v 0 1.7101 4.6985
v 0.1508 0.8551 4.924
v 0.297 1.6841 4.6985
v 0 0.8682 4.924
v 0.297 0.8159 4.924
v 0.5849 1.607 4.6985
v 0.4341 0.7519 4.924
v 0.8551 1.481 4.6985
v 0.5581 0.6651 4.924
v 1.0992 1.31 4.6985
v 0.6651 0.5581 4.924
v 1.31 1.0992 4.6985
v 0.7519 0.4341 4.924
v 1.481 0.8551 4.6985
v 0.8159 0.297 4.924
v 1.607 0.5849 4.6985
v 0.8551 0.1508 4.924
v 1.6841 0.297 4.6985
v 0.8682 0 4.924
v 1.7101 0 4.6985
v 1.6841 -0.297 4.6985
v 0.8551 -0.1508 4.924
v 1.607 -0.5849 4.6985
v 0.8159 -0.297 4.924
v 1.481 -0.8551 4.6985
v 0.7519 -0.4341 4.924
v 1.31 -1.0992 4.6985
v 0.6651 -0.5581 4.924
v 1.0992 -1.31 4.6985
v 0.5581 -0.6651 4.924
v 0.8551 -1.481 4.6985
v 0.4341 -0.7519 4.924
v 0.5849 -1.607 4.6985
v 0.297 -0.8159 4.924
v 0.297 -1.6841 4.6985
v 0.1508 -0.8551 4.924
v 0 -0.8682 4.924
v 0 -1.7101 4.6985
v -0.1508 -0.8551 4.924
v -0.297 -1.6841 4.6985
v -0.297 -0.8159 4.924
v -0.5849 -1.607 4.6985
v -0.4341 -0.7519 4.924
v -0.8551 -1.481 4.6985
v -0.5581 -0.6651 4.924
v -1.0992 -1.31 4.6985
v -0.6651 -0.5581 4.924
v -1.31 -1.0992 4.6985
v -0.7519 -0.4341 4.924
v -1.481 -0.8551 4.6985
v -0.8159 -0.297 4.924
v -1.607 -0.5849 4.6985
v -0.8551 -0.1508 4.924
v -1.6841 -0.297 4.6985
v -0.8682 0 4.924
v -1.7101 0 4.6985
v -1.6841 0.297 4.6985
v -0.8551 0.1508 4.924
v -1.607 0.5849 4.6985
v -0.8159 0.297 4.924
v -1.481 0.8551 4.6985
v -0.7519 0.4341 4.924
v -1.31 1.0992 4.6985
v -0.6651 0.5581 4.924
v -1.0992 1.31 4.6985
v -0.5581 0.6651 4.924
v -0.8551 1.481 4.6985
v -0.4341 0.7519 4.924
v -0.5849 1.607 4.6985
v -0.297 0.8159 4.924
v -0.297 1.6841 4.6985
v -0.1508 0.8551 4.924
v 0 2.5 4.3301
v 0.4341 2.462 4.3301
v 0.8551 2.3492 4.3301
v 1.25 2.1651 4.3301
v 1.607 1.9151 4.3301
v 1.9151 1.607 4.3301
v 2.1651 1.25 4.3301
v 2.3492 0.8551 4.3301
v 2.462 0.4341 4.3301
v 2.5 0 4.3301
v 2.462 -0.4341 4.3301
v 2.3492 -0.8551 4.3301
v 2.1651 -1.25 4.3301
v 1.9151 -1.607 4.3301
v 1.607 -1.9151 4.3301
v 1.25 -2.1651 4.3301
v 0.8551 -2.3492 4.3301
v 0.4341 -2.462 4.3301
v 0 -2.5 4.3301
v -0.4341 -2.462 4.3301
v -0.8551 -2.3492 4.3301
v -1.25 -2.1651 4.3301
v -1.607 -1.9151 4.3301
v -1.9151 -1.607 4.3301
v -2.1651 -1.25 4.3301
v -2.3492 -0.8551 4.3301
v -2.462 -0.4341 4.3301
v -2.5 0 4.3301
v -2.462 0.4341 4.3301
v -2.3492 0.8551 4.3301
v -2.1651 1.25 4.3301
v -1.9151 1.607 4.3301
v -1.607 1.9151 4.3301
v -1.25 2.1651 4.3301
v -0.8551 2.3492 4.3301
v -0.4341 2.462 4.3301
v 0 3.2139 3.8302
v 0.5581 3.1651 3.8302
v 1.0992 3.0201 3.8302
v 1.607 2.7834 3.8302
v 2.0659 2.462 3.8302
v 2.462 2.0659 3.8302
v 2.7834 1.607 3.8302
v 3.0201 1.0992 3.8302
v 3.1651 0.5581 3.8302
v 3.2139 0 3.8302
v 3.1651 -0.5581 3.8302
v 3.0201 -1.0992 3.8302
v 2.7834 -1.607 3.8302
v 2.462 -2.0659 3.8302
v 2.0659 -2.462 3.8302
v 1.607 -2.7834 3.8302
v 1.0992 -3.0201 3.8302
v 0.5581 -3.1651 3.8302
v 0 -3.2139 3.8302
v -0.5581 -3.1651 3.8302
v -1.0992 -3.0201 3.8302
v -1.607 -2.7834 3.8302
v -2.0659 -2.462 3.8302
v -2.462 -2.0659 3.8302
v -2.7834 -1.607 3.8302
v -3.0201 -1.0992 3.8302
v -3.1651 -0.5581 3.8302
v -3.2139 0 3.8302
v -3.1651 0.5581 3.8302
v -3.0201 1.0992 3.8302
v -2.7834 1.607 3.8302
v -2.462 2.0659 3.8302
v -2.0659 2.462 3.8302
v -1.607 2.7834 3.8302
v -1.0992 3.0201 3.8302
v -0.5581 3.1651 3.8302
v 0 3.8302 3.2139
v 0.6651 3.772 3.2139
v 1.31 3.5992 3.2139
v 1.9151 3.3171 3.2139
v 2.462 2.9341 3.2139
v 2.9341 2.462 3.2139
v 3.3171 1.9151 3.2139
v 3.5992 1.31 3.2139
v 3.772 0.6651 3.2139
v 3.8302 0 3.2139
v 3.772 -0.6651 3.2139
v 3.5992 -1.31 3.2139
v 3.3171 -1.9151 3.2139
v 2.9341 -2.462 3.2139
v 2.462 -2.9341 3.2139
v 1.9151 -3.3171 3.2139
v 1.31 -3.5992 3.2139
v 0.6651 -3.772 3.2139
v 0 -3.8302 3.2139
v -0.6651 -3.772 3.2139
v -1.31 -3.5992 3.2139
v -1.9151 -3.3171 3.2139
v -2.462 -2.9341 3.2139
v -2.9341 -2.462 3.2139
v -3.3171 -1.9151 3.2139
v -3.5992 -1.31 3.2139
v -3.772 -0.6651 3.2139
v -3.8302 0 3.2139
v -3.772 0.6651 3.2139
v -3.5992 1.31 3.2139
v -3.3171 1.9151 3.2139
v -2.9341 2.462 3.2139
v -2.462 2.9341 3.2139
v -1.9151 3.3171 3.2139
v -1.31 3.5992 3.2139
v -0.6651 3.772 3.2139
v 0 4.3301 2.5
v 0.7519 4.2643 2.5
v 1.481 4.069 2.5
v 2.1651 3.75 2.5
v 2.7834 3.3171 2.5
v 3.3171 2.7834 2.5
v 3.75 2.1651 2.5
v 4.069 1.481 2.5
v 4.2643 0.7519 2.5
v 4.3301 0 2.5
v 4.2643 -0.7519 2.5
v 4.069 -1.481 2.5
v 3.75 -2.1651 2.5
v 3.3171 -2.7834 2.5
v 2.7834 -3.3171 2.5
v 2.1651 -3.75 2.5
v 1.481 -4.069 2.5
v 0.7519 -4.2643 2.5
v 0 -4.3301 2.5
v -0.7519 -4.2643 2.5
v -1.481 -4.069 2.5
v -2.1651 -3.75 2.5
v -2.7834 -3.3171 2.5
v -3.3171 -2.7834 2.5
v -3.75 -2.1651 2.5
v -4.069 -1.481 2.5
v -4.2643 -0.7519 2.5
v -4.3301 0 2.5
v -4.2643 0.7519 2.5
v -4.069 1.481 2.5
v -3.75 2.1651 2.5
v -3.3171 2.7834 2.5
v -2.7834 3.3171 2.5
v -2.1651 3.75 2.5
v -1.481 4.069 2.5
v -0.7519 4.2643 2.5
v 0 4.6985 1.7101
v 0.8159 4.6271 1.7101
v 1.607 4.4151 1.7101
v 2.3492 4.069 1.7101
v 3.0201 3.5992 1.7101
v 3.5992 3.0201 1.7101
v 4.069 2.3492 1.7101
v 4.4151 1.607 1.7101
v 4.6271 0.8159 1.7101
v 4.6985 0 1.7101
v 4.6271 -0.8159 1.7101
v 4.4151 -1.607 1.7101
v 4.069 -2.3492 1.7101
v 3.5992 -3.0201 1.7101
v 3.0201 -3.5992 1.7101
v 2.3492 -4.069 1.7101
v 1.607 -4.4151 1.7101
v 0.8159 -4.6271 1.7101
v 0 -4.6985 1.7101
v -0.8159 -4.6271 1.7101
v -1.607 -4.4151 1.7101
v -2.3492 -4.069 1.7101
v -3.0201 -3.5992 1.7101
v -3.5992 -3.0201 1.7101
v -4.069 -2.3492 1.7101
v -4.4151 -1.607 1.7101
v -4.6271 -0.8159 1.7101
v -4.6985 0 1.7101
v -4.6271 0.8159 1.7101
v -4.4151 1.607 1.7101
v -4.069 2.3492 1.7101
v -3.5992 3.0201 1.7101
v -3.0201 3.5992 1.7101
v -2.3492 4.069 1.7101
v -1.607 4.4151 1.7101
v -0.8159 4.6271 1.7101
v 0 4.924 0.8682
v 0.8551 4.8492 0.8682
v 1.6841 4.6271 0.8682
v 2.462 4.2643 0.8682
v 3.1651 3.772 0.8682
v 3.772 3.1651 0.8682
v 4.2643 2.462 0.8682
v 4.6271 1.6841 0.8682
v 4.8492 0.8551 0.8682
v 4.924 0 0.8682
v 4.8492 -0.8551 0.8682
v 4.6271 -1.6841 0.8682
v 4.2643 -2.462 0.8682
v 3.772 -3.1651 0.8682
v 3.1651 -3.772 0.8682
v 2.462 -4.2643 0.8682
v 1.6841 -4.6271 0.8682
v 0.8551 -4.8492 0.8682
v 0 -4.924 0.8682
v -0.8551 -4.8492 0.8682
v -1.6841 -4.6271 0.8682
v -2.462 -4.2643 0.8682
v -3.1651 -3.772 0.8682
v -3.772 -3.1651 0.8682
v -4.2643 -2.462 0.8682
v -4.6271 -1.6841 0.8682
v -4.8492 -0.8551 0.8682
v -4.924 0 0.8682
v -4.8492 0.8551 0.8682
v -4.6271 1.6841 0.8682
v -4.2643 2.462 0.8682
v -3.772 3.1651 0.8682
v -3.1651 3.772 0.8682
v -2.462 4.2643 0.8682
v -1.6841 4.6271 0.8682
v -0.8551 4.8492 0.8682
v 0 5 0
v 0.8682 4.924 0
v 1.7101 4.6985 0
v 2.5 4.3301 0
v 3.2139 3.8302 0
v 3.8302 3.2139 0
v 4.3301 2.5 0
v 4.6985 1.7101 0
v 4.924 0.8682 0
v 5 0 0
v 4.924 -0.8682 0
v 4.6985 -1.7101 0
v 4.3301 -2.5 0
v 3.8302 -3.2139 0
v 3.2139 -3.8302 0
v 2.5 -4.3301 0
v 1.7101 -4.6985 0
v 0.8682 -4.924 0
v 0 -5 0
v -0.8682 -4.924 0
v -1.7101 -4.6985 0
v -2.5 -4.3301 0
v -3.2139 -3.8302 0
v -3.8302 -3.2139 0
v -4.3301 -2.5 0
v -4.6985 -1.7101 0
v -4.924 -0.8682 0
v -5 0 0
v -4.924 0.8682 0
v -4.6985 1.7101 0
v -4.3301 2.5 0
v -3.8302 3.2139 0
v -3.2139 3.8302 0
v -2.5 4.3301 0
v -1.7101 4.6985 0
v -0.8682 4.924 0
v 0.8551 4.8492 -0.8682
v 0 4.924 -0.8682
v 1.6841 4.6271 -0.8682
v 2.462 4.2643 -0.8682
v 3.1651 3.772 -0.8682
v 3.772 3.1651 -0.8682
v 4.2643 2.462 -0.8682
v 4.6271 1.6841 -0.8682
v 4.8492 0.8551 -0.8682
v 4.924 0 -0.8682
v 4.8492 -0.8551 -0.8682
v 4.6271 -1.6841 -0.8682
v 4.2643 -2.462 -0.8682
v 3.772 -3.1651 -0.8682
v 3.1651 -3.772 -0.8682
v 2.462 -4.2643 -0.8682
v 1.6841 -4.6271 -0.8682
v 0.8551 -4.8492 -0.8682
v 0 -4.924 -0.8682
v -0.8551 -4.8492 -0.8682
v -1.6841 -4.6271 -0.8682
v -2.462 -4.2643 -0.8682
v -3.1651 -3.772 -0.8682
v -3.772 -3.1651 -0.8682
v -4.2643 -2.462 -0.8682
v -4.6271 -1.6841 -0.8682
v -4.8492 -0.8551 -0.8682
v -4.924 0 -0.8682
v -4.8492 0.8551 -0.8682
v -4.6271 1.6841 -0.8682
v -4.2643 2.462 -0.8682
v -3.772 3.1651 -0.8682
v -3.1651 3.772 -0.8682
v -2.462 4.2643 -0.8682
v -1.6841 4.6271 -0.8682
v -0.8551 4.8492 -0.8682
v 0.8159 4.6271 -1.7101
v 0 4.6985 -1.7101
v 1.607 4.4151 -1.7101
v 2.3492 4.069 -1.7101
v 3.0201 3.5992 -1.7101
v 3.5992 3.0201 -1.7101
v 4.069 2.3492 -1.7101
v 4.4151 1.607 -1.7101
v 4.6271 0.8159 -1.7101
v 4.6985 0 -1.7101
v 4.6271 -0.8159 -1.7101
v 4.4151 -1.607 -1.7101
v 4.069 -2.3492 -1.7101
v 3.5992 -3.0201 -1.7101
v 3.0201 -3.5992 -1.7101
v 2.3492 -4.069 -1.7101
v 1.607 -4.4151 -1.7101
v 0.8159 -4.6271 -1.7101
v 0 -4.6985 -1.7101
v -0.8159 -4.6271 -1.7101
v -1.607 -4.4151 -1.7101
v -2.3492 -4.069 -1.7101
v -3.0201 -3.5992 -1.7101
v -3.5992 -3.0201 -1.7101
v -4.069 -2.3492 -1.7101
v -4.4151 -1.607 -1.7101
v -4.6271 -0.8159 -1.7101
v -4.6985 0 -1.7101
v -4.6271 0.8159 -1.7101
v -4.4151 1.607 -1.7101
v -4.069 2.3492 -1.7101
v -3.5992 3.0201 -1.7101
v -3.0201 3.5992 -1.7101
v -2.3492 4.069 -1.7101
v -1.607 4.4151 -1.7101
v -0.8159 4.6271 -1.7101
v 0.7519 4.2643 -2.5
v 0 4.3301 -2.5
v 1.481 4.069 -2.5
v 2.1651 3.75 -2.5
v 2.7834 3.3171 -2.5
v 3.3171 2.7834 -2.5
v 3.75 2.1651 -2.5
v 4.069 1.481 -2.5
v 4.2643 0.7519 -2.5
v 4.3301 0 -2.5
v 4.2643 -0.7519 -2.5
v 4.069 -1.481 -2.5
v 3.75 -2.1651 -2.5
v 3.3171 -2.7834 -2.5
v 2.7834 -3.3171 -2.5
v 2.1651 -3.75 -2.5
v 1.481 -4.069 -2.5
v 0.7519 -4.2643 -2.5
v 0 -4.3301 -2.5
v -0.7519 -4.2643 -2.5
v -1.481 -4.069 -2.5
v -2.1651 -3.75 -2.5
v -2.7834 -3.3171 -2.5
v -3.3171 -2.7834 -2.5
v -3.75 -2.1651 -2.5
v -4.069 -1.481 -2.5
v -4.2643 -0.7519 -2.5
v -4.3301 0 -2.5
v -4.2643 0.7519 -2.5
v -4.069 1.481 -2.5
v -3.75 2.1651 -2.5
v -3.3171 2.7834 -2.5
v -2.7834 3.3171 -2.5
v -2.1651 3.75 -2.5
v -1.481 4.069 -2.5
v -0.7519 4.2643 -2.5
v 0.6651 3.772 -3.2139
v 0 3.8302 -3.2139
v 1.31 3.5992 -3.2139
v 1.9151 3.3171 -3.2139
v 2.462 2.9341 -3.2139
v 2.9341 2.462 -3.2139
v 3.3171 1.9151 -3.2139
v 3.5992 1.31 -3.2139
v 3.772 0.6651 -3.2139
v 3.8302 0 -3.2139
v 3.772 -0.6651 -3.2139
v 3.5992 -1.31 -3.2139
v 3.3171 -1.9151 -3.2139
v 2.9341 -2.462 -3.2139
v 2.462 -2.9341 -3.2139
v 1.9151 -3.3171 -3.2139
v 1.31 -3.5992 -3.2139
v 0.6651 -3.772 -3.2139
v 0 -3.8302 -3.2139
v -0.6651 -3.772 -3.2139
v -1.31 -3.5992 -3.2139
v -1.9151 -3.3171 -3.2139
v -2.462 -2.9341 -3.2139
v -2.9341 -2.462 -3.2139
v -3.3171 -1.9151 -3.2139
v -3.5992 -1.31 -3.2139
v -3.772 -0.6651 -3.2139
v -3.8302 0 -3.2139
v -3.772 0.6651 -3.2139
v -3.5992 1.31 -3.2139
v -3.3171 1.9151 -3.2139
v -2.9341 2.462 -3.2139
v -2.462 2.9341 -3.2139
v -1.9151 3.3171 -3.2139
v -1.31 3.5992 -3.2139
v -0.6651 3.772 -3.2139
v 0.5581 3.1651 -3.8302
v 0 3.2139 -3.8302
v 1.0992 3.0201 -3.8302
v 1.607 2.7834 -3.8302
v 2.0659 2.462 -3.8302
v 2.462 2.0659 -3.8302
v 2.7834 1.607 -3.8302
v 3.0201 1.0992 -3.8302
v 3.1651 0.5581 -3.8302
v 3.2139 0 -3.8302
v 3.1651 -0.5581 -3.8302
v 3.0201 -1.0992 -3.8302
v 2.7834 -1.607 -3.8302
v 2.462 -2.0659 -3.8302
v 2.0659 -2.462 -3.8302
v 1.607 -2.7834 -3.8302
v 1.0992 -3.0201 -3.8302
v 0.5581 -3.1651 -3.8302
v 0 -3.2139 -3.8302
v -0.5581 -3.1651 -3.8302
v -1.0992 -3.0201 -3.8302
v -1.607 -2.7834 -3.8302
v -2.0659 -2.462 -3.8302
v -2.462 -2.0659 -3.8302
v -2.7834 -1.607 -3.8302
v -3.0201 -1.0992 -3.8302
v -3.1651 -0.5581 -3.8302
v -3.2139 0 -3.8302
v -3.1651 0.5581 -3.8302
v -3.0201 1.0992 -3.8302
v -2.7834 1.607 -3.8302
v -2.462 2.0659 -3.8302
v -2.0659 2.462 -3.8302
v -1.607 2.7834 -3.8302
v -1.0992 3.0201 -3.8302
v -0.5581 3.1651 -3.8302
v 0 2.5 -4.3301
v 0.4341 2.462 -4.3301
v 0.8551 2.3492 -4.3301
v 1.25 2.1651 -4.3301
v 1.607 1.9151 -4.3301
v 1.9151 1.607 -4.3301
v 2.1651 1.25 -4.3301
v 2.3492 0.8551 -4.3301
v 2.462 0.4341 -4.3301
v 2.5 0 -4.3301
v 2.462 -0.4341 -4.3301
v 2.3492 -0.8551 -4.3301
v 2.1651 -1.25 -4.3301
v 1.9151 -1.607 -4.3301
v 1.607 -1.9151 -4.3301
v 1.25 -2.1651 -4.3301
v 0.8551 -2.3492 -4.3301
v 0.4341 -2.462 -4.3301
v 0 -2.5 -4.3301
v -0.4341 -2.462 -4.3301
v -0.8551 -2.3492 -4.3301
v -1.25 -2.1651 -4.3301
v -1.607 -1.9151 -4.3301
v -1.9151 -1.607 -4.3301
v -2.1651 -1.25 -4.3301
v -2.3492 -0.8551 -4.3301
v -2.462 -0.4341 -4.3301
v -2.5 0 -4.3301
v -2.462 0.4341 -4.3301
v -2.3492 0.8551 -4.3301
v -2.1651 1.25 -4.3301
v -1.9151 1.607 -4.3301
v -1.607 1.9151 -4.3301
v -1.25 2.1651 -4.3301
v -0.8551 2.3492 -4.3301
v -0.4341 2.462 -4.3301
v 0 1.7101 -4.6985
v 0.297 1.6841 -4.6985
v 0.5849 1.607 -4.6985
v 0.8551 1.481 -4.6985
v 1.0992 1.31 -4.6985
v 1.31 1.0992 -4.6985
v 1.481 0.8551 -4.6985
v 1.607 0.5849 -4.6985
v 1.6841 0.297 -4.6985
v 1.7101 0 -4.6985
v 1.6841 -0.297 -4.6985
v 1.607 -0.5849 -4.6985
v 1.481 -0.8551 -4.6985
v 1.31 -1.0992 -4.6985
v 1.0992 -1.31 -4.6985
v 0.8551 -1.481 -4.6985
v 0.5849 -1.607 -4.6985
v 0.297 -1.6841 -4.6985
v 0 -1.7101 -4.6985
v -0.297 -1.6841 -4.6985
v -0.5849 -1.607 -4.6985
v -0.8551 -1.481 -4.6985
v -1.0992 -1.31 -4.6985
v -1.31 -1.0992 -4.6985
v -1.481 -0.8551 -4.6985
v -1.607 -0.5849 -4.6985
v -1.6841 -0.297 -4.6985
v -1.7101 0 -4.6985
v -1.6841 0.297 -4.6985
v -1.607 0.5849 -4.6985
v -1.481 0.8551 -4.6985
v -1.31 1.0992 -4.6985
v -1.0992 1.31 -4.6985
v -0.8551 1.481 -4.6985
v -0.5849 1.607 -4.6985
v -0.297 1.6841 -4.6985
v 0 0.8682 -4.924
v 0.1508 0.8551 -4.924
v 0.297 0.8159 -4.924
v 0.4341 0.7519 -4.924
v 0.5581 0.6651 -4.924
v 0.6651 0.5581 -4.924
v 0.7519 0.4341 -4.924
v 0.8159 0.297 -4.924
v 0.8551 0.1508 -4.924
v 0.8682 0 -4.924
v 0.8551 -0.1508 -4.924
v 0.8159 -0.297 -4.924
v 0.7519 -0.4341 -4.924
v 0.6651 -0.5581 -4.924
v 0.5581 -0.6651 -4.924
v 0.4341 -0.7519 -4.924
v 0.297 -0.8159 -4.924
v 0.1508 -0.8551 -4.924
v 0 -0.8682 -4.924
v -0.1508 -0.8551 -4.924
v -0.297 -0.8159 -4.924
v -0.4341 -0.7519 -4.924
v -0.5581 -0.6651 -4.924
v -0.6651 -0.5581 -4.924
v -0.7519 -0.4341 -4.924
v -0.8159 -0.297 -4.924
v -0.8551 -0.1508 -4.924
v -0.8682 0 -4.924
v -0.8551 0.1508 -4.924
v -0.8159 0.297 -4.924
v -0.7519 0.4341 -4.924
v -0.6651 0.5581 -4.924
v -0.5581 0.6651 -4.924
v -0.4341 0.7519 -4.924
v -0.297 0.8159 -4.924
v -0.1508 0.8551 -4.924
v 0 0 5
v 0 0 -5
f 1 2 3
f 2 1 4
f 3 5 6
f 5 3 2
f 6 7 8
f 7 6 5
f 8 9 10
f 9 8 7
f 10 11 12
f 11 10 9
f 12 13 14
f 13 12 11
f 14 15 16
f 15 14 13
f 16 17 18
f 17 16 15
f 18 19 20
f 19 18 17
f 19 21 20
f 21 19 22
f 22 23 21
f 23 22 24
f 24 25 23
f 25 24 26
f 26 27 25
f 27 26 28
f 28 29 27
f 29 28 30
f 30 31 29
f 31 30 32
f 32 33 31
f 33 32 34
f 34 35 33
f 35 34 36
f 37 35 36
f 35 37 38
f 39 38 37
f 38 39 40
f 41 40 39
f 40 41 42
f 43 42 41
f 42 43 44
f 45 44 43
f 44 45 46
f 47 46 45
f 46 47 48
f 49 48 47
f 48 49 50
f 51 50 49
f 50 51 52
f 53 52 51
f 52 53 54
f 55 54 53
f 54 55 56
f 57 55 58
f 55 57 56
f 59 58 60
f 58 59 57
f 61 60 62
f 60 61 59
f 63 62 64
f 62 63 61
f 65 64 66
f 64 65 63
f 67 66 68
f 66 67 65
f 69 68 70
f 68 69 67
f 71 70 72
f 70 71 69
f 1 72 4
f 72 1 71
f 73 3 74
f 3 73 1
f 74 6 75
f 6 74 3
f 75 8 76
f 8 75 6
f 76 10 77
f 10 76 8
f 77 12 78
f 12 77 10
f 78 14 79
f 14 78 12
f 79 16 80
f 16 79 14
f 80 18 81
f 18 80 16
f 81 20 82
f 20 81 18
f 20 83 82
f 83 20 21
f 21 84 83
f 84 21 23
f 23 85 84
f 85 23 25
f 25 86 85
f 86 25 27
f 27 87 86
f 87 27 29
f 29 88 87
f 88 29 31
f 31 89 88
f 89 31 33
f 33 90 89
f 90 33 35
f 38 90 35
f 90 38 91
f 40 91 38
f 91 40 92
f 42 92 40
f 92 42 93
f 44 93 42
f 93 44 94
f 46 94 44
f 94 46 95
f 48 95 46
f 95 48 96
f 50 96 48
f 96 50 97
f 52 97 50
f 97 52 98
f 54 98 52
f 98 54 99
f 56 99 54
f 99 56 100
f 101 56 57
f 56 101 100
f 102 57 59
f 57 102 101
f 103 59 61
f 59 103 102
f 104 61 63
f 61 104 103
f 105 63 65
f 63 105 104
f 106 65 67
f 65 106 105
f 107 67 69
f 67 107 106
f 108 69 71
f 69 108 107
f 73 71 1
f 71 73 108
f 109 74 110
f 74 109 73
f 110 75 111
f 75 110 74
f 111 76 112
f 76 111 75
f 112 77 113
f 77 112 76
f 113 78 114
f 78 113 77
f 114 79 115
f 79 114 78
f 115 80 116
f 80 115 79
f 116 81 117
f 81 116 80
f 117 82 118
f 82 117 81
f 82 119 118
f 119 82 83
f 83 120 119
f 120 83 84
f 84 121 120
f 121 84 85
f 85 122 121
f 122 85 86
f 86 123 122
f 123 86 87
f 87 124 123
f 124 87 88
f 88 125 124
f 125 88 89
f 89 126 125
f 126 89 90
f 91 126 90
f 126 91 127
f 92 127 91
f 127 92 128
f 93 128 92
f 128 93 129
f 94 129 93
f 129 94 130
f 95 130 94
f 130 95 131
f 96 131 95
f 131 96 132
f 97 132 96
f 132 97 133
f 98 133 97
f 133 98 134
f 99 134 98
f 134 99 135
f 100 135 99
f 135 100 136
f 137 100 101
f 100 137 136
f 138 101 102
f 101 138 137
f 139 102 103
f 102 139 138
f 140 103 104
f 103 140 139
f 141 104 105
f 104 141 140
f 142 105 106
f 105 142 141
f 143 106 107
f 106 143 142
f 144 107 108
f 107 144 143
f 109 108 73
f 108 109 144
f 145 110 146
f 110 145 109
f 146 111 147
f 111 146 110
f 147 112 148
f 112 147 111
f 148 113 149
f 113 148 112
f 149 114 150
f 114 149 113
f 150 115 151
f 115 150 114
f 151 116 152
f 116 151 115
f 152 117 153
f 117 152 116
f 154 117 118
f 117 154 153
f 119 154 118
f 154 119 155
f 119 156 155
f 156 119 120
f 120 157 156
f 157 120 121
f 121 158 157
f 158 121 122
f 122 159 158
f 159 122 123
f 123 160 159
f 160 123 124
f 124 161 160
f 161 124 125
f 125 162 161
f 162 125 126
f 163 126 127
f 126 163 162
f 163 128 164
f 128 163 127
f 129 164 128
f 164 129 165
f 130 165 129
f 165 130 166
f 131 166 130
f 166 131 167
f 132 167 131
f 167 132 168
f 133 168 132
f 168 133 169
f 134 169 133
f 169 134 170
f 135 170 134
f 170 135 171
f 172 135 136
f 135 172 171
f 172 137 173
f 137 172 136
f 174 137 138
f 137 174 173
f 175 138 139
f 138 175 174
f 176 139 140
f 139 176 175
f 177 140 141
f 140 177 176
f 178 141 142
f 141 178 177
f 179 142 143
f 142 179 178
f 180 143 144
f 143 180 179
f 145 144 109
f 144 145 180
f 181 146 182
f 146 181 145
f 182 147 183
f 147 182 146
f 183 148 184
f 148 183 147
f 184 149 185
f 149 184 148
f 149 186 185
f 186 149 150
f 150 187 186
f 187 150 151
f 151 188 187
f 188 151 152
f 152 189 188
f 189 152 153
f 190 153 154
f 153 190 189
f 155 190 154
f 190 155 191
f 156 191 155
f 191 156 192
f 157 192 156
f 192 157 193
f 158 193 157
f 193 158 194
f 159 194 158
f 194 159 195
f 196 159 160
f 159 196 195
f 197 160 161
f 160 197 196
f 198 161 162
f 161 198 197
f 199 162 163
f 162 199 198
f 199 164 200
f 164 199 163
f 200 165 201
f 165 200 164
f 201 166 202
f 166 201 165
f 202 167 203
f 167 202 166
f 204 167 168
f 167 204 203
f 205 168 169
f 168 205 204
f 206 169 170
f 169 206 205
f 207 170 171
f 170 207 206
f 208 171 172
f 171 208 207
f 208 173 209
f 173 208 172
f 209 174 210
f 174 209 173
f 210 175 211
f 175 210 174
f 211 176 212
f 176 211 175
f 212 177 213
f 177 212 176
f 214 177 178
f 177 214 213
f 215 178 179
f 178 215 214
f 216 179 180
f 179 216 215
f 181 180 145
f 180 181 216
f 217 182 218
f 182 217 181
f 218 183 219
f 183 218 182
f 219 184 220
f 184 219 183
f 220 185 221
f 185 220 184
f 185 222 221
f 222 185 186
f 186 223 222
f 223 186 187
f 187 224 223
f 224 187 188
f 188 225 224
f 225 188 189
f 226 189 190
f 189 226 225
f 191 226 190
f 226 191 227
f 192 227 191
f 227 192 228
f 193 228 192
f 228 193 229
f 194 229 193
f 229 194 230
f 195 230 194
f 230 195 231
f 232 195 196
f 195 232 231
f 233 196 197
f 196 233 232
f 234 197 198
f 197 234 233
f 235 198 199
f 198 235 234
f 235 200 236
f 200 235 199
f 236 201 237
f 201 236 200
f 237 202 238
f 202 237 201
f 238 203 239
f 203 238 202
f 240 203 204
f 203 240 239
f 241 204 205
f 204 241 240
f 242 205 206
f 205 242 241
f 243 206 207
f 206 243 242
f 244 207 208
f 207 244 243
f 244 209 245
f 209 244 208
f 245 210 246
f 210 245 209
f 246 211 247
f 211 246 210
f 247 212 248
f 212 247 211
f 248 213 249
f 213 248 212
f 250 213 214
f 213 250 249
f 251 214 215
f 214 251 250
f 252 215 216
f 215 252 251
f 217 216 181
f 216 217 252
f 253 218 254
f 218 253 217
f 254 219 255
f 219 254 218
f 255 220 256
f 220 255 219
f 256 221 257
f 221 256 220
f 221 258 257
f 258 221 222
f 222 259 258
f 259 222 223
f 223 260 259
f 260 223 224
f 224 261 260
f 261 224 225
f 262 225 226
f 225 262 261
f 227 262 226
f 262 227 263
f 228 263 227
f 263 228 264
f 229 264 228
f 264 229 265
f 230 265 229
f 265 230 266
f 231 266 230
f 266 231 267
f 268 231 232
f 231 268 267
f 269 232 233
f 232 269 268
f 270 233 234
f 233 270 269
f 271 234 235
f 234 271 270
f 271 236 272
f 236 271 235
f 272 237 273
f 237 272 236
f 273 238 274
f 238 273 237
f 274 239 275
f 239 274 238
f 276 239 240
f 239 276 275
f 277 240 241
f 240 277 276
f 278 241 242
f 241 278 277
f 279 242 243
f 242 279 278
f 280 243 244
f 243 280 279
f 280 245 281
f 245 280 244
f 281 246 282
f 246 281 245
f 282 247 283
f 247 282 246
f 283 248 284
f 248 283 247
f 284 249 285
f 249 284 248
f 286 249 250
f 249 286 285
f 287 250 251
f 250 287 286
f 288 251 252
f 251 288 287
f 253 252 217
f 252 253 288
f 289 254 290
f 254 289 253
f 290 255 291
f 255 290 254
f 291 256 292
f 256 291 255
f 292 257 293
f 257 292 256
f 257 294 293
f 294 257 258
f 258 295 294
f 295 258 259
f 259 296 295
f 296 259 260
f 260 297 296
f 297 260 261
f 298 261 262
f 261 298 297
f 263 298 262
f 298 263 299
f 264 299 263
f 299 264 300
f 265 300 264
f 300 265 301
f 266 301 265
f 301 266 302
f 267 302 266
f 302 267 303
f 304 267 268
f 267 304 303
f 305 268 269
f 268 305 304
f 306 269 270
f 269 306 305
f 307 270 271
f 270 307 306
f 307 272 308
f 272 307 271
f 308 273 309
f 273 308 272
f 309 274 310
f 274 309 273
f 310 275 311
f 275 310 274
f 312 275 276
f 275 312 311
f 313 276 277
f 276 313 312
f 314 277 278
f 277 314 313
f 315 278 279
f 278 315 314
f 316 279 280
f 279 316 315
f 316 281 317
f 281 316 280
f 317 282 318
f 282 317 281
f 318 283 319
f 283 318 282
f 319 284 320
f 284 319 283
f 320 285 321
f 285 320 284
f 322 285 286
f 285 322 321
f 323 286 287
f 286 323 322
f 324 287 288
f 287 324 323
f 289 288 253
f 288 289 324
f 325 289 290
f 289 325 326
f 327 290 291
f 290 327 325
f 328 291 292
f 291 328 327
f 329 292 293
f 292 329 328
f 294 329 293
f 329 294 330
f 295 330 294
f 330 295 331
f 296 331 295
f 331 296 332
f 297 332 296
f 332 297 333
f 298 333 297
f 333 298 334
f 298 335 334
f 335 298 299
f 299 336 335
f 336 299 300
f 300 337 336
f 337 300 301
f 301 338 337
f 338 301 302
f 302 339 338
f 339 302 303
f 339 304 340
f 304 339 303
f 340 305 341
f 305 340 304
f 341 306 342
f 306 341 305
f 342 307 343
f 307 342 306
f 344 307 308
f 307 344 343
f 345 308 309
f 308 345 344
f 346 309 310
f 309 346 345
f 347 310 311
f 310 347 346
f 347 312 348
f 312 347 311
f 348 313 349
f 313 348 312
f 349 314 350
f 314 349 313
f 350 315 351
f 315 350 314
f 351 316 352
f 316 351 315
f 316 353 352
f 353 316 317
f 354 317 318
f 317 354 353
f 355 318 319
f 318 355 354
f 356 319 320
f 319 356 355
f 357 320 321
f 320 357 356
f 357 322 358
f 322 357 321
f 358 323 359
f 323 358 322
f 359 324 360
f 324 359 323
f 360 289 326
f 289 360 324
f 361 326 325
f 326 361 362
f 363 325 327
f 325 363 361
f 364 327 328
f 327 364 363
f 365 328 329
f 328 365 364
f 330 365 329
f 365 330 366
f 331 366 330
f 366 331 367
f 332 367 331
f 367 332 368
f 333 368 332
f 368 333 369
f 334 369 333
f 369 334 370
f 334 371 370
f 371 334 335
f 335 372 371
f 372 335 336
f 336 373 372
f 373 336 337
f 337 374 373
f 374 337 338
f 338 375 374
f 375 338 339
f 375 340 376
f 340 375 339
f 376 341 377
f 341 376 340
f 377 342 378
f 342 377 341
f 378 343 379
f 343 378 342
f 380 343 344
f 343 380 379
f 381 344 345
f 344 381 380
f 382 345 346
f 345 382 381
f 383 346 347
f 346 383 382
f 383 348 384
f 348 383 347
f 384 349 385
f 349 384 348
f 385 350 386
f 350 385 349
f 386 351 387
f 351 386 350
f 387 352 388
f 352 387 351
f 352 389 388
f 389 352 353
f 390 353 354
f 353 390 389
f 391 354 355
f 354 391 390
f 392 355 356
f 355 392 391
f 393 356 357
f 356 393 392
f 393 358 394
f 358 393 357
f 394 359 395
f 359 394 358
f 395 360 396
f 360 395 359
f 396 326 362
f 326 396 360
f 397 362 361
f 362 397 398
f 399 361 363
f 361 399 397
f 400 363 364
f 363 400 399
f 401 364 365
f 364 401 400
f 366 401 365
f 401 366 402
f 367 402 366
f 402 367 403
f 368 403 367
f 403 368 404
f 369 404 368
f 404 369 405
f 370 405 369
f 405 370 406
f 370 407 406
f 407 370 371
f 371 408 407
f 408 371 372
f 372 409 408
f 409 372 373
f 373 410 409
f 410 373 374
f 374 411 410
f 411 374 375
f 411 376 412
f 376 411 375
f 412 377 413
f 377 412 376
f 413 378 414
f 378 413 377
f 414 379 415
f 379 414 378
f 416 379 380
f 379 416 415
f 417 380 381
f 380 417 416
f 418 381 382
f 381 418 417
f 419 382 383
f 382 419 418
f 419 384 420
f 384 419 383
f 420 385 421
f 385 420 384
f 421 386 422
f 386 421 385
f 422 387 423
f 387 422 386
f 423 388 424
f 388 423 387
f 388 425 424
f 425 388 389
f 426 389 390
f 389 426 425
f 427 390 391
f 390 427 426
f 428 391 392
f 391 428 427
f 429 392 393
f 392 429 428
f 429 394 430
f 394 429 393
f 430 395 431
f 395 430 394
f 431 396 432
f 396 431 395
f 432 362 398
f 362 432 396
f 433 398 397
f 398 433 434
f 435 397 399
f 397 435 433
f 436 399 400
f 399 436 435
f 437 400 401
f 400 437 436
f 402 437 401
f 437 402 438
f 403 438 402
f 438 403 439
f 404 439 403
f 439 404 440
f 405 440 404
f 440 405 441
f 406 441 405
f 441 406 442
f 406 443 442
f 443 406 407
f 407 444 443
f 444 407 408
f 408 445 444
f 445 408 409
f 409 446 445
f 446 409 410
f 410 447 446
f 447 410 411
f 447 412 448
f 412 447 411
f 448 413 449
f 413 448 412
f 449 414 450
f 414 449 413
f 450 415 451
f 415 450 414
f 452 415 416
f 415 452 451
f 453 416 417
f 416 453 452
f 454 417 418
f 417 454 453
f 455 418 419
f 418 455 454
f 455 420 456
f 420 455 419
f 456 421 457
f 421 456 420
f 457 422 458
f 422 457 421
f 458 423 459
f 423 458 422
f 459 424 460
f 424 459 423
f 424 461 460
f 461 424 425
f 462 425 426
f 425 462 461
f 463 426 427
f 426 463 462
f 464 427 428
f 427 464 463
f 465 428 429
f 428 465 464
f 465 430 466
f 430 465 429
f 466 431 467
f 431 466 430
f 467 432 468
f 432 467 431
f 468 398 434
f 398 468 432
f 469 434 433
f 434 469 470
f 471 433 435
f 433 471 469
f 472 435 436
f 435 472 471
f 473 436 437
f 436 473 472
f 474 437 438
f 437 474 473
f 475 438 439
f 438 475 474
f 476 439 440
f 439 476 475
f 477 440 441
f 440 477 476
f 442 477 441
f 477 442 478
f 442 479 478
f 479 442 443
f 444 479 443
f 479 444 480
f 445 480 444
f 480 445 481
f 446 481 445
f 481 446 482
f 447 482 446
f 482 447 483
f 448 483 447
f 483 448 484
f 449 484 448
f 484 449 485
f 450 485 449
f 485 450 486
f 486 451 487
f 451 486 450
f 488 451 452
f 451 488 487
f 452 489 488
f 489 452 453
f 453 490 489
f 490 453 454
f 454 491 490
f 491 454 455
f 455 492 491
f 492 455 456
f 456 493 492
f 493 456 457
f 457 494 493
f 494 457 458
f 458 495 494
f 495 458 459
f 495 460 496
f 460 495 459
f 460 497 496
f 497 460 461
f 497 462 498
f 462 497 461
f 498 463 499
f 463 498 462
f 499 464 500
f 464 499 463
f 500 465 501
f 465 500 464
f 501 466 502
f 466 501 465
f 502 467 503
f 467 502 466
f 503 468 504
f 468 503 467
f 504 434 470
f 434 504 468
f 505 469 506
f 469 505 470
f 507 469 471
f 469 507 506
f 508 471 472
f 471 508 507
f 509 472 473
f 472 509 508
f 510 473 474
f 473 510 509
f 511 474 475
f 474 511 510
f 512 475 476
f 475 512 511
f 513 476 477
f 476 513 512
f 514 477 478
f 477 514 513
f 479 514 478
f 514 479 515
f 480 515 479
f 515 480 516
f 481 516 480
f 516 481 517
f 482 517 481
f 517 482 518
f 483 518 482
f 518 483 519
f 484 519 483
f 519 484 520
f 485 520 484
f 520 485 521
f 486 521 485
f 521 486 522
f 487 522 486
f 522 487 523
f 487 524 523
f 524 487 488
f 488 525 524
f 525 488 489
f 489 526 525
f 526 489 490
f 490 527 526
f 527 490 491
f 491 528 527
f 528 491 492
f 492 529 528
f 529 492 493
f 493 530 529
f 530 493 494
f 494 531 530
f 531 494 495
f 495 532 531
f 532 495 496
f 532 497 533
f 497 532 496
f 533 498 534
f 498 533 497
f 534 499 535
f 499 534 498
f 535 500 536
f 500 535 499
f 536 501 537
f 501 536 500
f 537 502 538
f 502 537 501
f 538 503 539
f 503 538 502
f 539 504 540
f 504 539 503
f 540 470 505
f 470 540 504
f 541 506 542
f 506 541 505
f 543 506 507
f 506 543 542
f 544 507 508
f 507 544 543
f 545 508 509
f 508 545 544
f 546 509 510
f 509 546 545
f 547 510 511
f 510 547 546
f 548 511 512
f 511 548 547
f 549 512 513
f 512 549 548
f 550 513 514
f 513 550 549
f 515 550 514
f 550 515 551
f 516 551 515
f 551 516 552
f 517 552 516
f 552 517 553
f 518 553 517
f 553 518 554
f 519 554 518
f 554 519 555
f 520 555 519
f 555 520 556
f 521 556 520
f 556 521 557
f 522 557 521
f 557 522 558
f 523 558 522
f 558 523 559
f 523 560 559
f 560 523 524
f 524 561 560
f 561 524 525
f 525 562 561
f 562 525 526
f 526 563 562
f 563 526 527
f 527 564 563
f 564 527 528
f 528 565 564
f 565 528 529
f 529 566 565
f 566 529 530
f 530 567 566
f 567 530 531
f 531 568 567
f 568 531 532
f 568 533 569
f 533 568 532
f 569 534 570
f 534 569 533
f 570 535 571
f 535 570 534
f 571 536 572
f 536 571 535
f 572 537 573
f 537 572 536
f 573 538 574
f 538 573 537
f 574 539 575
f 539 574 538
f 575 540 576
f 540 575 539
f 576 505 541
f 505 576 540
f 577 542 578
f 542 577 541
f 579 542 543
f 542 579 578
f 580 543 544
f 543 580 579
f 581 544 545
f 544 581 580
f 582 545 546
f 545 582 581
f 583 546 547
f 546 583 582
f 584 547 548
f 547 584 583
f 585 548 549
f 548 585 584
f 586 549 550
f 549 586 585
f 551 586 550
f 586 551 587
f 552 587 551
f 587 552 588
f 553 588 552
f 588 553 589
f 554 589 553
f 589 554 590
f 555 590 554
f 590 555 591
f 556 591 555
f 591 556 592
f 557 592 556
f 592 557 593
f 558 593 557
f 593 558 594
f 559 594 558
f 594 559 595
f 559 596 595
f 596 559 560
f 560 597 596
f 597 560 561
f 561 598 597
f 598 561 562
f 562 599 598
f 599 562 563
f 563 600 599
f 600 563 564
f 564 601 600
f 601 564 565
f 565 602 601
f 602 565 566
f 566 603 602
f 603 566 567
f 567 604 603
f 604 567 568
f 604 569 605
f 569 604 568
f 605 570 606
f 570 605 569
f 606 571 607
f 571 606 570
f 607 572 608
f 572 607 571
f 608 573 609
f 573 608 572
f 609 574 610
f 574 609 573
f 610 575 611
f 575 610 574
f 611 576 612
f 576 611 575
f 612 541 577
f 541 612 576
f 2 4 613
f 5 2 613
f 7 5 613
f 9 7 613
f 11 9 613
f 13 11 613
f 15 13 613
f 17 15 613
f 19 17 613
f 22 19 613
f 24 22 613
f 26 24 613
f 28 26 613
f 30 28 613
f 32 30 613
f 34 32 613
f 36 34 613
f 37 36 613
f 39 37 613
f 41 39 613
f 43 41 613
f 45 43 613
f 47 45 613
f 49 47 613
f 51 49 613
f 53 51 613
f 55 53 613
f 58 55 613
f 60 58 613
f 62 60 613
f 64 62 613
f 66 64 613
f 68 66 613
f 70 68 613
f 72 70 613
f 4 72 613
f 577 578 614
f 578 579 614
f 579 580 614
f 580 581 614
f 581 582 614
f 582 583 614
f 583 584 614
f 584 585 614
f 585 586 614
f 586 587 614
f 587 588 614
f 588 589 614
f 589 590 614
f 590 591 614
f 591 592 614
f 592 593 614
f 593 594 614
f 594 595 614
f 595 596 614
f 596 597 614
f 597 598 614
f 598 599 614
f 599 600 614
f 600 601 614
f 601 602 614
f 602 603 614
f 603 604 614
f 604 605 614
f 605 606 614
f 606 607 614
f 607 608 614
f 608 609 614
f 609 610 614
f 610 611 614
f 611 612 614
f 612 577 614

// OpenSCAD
fDraw(fSphere(5));

///// Drawing modules
module fDraw(model) {
  polyhedron(points=fPoints(model),  faces=fFaces(model));
}

module fDrawN(model, scales) {
  fDraw(model);
  points = fPoints(model);
  model_max = fMaxPoint(model);
  translation =
    [for (axis = [0 : 2])
     scales[axis] * model_max[axis]];
  translate(translation) children();  
}

module fDrawX(model) {
  fDrawN(model, [1, 0, 0]) children();
}

module fDrawY(model) {
  fDrawN(model, [0, 1, 0]) children();
}

module fDrawZ(model) {
  fDrawN(model, [0, 0, 1]) children();
}

///// 3D object creation functions
function fCube(dims) = (
  let(x = fIsVector(dims) ? dims[0] : dims,
      y = fIsVector(dims) ? dims[1] : dims,
      z = fIsVector(dims) ? dims[2] : dims)
  [
    [fKeyPoints,  fCartesianProduct([[0, x], [0, y], [0, z]])],
    [fKeyFaces, [
      [0, 2, 3, 1], // -x
      [0, 1, 5, 4], // -y
      [0, 4, 6, 2], // -z
      [4, 5, 7, 6], // +x
      [2, 6, 7, 3], // +y
      [1, 3, 7, 5], // +z
    ]],
  ]
);

function fCylinder(r, h, start_angle=0, end_angle=360, sides=36) = (
  let(degrees_per_face = (end_angle - start_angle) / sides,
      face_range = [0 : sides - 1],
      vertical_range = [0 : sides],
      complete = (start_angle == 0 && end_angle == 360),
      bottom_index = (sides + 1) * 2)
  [
    [fKeyPoints, concat(
      fCartesianProduct([
        [for (i = vertical_range)
         let (angle = start_angle + (i * degrees_per_face))
         [r * sin(angle), r * cos(angle)]],
        [0, h],
      ]),
      complete ? [] : [
        [0, 0, 0], // bottom center
        [0, 0, h], // top center
      ]
    )],
    [fKeyFaces, concat(
      // bottom
      [concat(
        [for (i = [sides : -1 : 0]) i * 2],
        complete ? [] : [bottom_index]
      )],
      // top
      [concat(
        [for (i = [0 : sides]) i * 2 + 1],
        complete ? [] : [bottom_index + 1]
      )],
      // sides
      [for (i = face_range)
        [for (j = [2, 3, 1, 0]) i * 2 + j]],
      // cut ins
      complete ? [] : [
        [0, 1, bottom_index + 1, bottom_index],
        [bottom_index - 1, bottom_index - 2, bottom_index, bottom_index + 1],
      ]
    )],
  ]
);

function fSphere(r, sides=36, stripes=18) = (
  let(stripe_slice = 180 / stripes,
      side_slice = 360 / sides,
      top_index = (stripes - 1) * sides,
      bottom_index = top_index + 1)
  [
    [fKeyPoints, concat(
      [for (stripe_index = [1 : stripes - 1])
       for (side_index = [0 : sides - 1])
       let (stripe_angle = stripe_index * stripe_slice,
            side_angle = side_index * side_slice,
            stripe_radius = r * sin(stripe_angle),
            stripe_z = r * cos(stripe_angle),
            side_x = stripe_radius * sin(side_angle),
            side_y = stripe_radius * cos(side_angle))
       [side_x, side_y, stripe_z]
      ],
      [
        [0, 0, r],  // top
        [0, 0, -r],  // bottom
      ]
    )],
    [fKeyFaces, concat(
      [for (stripe_index = [2 : stripes - 1])
       for (side_index = [0 : sides - 1])
       let (prev_side_base = (stripe_index - 2) * sides,
            side_base = (stripe_index - 1) * sides)
       [prev_side_base + (side_index + 1) % sides,
        prev_side_base + side_index,
        side_base + side_index,
        side_base + (side_index + 1) % sides]
      ],
      [for (side_index = [0 : sides - 1])
       [top_index, side_index, (side_index + 1) % sides]
      ],
      [for (side_index = [0 : sides - 1])
       let (side_base = (stripes - 2) * sides)
       [bottom_index,
        side_base + (side_index + 1) % sides,
        side_base + side_index]
      ]
    )],
  ]
);
        
///// 3D object information functions
function fMinPoint(model) = (
  [for (axis = [0 : 2])
   min([for (point = fPoints(model)) point[axis]])]
);

function fMaxPoint(model) = (
  [for (axis = [0 : 2])
   max([for (point = fPoints(model)) point[axis]])]
);  

function fCenterPoint(model) = (
  let(model_min = fMinPoint(model),
      model_max = fMaxPoint(model),
      model_size =
        [for (axis = [0 : 2])
         model_max[axis] - model_min[axis]])
  [for (axis = [0 : 2])
   model_min[axis] + (model_size[axis] / 2)]
);
        
///// 3D object translation functions
function fTranslate(model, translation) = (
  [
    [fKeyPoints,
      [for (point = fPoints(model))
        [for (axis = [0 : 2])
         point[axis] + translation[axis]]
      ]
    ],
    [fKeyFaces, fFaces(model)],
  ]
);

function fZeroN(model, scales) = (
  let(model_min = fMinPoint(model),
      translation =
        [for (axis = [0 : 2])
         scales[axis] * model_min[axis]])
  fTranslate(model, translation)
);
       
function fZeroX(model) = (
  fZeroN(model, [-1, 0, 0])
);
       
function fZeroY(model) = (
  fZeroN(model, [0, -1, 0])
);
       
function fZeroZ(model) = (
  fZeroN(model, [0, 0, -1])
);

function fCenterN(model, scales) = (
  let(model_center = fCenterPoint(model),
      translation =
        [for (axis = [0 : 2])
        scales[axis] * model_center[axis]])
  fTranslate(model, translation)
);
        
function fCenterX(model) = (
  fCenterN(model, [-1, 0, 0])
);

function fCenterY(model) = (
  fCenterN(model, [0, -1, 0])
);
        
function fCenterZ(model) = (
  fCenterN(model, [0, 0, -1])
);

///// Constants
fKeyPoints = "points";
fKeyFaces = "faces";

fTypeUndef = "undef";
fTypeInt = "int";
fTypeFloat = "float";
fTypeString = "string";
fTypeBoolean = "boolean";
fTypeVector = "vector";
fTypeUnknown = "unknown";

///// Utility functions
function fType(x) = (
  x == undef ? fTypeUndef
  : floor(x) == x ? fTypeInt
  : abs(x) + 1 > abs(x) ? fTypeFloat 
  : str(x) == x ? fTypeString
  : str(x) == "false" || str(x) == "true" ? fTypeBoolean
  : (x[0] == x[0]) && len(x) != undef ? fTypeVector
  : fTypeUnknown
);

function fIsVector(x) = (
  fType(x) == fTypeVector
);

function fIsInt(x) = (
  fType(x) == fTypeInt
);

function fIsFloat(x) = (
  fType(x) == fTypeFloat
);

function fIsString(x) = (
  fType(x) == fTypeString
);

function fIsBoolean(x) = (
  fType(x) == fTypeBoolean
);

function fIsVector(x) = (
  fType(x) == fTypeVector
);

function fMapLookup(key, model) = (
  [for (pair = model)
   let (iter_key = pair[0],
        iter_value = pair[1])
   if (key == iter_key)
   iter_value][0]
);

function fVectorSlice(vec, start=0, step=undef, end=undef) = (
  let(real_end = (end == undef) ? len(vec) - 1 : end,
      real_step = (step == undef) ?
        ((real_end > start) ? 1 : -1)
        : step)
  [for (i = [start : real_step : real_end])
   vec[i]]
);
        
function fCartesianProduct(vecs) = (
  len(vecs) == 1 ?
    vecs[0]
    :
    [for (val1 = vecs[0])
     for (val2 = fCartesianProduct(fVectorSlice(vecs, start=1)))
     concat(val1, val2)]
);

function fPoints(model) = (
  fMapLookup(fKeyPoints, model)
);
        
function fFaces(model) = (
  fMapLookup(fKeyFaces, model)
);
